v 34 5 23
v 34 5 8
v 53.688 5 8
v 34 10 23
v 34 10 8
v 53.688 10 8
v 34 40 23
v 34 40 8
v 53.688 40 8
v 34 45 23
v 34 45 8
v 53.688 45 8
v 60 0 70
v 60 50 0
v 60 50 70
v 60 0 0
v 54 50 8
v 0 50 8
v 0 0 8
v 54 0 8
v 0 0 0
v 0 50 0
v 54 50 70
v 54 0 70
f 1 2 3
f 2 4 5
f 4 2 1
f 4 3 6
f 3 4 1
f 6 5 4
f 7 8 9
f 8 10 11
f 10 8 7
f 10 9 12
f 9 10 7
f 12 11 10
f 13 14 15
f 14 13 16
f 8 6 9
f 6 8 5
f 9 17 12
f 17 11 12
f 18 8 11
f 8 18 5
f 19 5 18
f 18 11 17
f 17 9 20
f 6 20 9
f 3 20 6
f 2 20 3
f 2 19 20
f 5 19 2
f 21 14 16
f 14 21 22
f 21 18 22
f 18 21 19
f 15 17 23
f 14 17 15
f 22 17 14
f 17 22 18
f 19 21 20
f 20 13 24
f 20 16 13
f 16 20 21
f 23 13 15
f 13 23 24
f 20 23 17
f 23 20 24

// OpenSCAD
$fn = 32;

// ----------------------------------------------------------------------
// Rib bracket: 2-gusset L bracket
// ----------------------------------------------------------------------

// --- parameters (mm) ---
base_l = 60;              // foot length, X
base_w = 50;              // foot width, Y
base_t = 8;               // foot thickness
plate_t = 6;              // upright plate thickness
plate_h = 70;             // overall height
gus_l = 20;               // gusset leg along the foot
gus_h = 16;               // gusset height
gus_t = 5;                // gusset thickness
gus_edge = 5;             // gusset margin from the foot edge
n_gus = 2;                // gusset count

gus_pitch = (base_w - 2 * gus_edge - gus_t) / (n_gus - 1);  // gusset pitch

union() {
  cube([base_l, base_w, base_t]);
  translate([base_l - plate_t, 0, base_t - 1])
    cube([plate_t, base_w, plate_h - base_t + 1]);
  for (i = [0 : n_gus - 1])
    translate([base_l - plate_t - gus_l, gus_edge + i * gus_pitch, base_t - 1])
      rotate([-90, 0, 0])
        linear_extrude(height = gus_t)
          polygon(points = [[0, 0], [gus_l + 1, 0], [0, -gus_h]]);
}
